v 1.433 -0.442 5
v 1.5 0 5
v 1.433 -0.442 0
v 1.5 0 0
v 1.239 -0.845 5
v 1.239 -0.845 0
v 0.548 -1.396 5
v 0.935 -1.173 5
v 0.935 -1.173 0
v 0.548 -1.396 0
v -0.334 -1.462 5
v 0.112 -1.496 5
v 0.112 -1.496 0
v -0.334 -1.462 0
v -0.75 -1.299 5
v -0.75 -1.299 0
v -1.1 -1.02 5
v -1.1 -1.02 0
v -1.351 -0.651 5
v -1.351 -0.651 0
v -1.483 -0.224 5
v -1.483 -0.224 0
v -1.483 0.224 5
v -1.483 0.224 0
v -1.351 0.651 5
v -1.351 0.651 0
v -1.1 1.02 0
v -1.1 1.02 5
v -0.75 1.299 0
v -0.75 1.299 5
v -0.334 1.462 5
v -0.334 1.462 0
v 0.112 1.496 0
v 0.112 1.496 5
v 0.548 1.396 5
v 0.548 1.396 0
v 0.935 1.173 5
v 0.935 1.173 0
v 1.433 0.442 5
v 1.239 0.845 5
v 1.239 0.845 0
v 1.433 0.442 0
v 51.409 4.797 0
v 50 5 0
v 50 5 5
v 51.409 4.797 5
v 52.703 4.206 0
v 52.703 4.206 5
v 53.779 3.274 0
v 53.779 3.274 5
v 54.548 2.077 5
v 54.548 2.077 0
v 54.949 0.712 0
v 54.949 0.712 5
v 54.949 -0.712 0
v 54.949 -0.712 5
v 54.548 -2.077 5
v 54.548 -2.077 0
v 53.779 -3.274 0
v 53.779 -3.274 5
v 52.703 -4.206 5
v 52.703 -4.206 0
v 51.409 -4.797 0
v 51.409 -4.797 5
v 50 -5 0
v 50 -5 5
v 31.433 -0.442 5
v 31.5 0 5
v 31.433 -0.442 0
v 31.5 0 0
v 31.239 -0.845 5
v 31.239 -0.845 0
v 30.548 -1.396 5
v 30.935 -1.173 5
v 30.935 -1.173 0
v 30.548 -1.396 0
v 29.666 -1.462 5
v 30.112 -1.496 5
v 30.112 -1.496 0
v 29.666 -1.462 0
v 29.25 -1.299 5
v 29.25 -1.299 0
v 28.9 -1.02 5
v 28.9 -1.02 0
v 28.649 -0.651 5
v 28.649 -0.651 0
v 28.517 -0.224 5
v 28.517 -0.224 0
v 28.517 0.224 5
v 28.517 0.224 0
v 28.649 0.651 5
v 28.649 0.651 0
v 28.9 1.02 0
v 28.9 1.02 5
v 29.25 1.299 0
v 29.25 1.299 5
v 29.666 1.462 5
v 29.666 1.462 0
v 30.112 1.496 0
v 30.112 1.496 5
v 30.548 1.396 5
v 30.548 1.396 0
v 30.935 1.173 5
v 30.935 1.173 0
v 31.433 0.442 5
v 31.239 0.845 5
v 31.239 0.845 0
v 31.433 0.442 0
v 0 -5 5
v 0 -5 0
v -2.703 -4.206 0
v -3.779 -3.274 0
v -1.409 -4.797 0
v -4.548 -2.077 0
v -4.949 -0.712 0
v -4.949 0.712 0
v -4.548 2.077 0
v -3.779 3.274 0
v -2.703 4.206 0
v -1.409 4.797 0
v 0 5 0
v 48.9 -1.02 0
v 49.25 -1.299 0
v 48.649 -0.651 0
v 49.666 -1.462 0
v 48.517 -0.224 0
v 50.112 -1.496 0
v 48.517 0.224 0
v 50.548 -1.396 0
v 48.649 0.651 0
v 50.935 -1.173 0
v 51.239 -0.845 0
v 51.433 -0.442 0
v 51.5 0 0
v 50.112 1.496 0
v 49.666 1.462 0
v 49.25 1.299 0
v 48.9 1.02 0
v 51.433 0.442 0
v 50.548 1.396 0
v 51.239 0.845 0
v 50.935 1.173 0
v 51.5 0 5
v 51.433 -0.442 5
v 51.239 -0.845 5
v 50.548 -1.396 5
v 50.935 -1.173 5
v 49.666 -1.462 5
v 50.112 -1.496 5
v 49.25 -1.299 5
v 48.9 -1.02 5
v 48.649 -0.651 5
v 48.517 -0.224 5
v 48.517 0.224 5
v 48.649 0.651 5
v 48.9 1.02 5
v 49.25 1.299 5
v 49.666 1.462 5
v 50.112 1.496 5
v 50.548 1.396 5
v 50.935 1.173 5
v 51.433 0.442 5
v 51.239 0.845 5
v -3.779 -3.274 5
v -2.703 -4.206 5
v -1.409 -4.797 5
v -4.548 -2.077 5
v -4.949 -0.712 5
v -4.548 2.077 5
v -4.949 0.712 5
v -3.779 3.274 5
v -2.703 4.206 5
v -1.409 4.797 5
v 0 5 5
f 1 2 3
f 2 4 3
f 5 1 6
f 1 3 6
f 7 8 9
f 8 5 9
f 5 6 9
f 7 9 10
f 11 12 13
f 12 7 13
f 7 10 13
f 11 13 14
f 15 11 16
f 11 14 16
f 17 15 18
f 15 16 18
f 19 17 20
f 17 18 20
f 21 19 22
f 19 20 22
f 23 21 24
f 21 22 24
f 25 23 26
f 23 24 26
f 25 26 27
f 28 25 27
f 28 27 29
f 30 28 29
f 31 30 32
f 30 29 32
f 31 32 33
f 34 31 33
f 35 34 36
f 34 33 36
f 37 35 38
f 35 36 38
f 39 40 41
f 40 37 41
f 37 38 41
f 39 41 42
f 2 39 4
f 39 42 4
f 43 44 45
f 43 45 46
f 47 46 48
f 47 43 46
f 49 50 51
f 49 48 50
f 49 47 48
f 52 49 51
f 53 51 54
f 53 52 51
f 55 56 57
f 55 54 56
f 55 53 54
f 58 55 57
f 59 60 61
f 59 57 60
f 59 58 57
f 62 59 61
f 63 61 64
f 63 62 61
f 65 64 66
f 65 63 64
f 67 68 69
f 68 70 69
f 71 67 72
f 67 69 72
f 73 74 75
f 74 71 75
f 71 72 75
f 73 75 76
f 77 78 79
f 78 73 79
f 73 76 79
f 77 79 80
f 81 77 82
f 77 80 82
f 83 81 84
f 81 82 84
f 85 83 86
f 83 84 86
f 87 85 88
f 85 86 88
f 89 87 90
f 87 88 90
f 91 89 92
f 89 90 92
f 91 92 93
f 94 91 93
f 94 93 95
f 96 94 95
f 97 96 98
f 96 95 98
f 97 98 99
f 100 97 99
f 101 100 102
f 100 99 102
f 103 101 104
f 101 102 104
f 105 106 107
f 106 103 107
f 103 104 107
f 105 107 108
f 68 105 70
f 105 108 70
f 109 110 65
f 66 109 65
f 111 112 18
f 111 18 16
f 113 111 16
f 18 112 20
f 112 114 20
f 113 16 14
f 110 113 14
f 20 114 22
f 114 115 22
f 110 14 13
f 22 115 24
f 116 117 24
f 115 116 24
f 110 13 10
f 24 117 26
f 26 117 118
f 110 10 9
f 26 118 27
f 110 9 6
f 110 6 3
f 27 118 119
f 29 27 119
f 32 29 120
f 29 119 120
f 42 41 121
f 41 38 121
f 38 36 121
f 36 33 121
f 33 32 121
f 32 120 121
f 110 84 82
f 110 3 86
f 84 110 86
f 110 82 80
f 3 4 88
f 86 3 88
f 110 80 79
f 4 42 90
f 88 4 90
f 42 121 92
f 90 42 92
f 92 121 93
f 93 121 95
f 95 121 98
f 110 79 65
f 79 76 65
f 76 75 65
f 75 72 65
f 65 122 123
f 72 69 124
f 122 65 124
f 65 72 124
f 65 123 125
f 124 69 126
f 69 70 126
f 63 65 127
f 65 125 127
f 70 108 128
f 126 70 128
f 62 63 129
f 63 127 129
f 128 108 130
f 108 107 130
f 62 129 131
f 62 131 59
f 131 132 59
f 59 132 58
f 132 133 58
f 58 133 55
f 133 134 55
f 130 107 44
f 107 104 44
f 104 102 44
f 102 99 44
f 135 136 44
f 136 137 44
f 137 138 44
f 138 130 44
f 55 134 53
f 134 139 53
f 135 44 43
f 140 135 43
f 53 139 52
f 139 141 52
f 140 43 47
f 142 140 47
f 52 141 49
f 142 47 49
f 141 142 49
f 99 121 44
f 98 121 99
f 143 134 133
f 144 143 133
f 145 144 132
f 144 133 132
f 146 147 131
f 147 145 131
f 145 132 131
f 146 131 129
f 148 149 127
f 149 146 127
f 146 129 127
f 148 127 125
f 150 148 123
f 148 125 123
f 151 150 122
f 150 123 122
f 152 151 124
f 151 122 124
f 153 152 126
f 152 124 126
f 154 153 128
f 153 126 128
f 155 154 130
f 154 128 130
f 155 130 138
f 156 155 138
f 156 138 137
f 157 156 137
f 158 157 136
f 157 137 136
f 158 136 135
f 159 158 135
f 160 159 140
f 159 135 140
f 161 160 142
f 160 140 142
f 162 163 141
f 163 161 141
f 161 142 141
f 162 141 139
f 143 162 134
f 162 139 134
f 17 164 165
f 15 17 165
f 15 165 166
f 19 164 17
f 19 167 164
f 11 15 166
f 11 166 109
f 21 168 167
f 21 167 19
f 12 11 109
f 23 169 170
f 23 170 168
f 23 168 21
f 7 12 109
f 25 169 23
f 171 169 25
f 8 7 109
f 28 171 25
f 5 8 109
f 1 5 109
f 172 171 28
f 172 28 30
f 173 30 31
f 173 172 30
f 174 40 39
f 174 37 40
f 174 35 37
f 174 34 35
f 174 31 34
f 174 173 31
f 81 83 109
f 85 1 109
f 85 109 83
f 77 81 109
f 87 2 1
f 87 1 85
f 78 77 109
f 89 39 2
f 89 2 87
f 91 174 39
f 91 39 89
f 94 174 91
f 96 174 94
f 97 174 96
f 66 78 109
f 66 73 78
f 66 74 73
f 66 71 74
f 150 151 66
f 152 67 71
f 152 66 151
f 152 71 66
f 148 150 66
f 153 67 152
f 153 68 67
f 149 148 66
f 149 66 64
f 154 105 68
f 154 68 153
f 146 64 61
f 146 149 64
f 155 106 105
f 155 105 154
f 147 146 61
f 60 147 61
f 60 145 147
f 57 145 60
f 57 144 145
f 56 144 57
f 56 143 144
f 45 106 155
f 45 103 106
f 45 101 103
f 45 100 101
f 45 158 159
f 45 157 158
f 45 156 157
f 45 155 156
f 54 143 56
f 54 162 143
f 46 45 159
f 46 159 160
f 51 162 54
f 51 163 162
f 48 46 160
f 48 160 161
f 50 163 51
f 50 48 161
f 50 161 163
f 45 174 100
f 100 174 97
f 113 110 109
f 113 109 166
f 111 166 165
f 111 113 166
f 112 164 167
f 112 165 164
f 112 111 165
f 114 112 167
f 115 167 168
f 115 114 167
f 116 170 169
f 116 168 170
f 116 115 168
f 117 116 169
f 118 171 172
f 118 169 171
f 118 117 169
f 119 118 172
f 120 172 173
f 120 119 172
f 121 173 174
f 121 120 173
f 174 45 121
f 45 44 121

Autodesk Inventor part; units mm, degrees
ref_plane "YZ Plane" through (0, 0, 0) normal (1, 0, 0) x (0, 1, 0)
ref_plane "XZ Plane" through (0, 0, 0) normal (0, 1, 0) x (-1, 0, 0)
ref_plane "XY Plane" through (0, 0, 0) normal (0, 0, 1) x (1, 0, 0)
sketch "Sketch1" plane through (0, 0, 0) normal (0, 0, 1) x (1, 0, 0)
  line L0 (0, 0) -> (50, 0) construction
  line L1 (0, -5) -> (50, -5)
  line L2 (50, 5) -> (0, 5)
  arc A0 (0, 5) -> (0, -5) centre (0, 0) ccw
  arc A1 (50, -5) -> (50, 5) centre (50, 0) ccw
  line L3 (0, 0) -> (50, 0) construction
  circle A2 centre (0, 0) radius 1.5
  circle A3 centre (50, 0) radius 1.5
  circle A4 centre (30, 0) radius 1.5
  point P0 (25, 0)
  dimension "d0" = 50
  dimension "d1" = 0
  dimension "d2" = 10
  dimension "d3" = 3
  dimension "d4" = 3
  dimension "d5" = 3
  dimension "d6" = 20
extrude "Extrusion1" add sketch "Sketch1" along normal blind 5
sketch "Sketch2" plane through (0, 0, 5) normal (0, 0, 1) x (1, 0, 0)
  arc A0 (50, -5) -> (50, 5) centre (50, 0) ccw projected
  line L0 (50, 5) -> (0, 5) projected
  arc A1 (0, 5) -> (0, -5) centre (0, 0) ccw projected
  line L1 (0, -5) -> (50, -5) projected
  circle A2 centre (30, 0) radius 1.5 projected
  circle A3 centre (50, 0) radius 1.5 projected
  circle A4 centre (0, 0) radius 1.5 projected
properties part number "Arm3_3D" material "Aluminum 6061, Welded"
